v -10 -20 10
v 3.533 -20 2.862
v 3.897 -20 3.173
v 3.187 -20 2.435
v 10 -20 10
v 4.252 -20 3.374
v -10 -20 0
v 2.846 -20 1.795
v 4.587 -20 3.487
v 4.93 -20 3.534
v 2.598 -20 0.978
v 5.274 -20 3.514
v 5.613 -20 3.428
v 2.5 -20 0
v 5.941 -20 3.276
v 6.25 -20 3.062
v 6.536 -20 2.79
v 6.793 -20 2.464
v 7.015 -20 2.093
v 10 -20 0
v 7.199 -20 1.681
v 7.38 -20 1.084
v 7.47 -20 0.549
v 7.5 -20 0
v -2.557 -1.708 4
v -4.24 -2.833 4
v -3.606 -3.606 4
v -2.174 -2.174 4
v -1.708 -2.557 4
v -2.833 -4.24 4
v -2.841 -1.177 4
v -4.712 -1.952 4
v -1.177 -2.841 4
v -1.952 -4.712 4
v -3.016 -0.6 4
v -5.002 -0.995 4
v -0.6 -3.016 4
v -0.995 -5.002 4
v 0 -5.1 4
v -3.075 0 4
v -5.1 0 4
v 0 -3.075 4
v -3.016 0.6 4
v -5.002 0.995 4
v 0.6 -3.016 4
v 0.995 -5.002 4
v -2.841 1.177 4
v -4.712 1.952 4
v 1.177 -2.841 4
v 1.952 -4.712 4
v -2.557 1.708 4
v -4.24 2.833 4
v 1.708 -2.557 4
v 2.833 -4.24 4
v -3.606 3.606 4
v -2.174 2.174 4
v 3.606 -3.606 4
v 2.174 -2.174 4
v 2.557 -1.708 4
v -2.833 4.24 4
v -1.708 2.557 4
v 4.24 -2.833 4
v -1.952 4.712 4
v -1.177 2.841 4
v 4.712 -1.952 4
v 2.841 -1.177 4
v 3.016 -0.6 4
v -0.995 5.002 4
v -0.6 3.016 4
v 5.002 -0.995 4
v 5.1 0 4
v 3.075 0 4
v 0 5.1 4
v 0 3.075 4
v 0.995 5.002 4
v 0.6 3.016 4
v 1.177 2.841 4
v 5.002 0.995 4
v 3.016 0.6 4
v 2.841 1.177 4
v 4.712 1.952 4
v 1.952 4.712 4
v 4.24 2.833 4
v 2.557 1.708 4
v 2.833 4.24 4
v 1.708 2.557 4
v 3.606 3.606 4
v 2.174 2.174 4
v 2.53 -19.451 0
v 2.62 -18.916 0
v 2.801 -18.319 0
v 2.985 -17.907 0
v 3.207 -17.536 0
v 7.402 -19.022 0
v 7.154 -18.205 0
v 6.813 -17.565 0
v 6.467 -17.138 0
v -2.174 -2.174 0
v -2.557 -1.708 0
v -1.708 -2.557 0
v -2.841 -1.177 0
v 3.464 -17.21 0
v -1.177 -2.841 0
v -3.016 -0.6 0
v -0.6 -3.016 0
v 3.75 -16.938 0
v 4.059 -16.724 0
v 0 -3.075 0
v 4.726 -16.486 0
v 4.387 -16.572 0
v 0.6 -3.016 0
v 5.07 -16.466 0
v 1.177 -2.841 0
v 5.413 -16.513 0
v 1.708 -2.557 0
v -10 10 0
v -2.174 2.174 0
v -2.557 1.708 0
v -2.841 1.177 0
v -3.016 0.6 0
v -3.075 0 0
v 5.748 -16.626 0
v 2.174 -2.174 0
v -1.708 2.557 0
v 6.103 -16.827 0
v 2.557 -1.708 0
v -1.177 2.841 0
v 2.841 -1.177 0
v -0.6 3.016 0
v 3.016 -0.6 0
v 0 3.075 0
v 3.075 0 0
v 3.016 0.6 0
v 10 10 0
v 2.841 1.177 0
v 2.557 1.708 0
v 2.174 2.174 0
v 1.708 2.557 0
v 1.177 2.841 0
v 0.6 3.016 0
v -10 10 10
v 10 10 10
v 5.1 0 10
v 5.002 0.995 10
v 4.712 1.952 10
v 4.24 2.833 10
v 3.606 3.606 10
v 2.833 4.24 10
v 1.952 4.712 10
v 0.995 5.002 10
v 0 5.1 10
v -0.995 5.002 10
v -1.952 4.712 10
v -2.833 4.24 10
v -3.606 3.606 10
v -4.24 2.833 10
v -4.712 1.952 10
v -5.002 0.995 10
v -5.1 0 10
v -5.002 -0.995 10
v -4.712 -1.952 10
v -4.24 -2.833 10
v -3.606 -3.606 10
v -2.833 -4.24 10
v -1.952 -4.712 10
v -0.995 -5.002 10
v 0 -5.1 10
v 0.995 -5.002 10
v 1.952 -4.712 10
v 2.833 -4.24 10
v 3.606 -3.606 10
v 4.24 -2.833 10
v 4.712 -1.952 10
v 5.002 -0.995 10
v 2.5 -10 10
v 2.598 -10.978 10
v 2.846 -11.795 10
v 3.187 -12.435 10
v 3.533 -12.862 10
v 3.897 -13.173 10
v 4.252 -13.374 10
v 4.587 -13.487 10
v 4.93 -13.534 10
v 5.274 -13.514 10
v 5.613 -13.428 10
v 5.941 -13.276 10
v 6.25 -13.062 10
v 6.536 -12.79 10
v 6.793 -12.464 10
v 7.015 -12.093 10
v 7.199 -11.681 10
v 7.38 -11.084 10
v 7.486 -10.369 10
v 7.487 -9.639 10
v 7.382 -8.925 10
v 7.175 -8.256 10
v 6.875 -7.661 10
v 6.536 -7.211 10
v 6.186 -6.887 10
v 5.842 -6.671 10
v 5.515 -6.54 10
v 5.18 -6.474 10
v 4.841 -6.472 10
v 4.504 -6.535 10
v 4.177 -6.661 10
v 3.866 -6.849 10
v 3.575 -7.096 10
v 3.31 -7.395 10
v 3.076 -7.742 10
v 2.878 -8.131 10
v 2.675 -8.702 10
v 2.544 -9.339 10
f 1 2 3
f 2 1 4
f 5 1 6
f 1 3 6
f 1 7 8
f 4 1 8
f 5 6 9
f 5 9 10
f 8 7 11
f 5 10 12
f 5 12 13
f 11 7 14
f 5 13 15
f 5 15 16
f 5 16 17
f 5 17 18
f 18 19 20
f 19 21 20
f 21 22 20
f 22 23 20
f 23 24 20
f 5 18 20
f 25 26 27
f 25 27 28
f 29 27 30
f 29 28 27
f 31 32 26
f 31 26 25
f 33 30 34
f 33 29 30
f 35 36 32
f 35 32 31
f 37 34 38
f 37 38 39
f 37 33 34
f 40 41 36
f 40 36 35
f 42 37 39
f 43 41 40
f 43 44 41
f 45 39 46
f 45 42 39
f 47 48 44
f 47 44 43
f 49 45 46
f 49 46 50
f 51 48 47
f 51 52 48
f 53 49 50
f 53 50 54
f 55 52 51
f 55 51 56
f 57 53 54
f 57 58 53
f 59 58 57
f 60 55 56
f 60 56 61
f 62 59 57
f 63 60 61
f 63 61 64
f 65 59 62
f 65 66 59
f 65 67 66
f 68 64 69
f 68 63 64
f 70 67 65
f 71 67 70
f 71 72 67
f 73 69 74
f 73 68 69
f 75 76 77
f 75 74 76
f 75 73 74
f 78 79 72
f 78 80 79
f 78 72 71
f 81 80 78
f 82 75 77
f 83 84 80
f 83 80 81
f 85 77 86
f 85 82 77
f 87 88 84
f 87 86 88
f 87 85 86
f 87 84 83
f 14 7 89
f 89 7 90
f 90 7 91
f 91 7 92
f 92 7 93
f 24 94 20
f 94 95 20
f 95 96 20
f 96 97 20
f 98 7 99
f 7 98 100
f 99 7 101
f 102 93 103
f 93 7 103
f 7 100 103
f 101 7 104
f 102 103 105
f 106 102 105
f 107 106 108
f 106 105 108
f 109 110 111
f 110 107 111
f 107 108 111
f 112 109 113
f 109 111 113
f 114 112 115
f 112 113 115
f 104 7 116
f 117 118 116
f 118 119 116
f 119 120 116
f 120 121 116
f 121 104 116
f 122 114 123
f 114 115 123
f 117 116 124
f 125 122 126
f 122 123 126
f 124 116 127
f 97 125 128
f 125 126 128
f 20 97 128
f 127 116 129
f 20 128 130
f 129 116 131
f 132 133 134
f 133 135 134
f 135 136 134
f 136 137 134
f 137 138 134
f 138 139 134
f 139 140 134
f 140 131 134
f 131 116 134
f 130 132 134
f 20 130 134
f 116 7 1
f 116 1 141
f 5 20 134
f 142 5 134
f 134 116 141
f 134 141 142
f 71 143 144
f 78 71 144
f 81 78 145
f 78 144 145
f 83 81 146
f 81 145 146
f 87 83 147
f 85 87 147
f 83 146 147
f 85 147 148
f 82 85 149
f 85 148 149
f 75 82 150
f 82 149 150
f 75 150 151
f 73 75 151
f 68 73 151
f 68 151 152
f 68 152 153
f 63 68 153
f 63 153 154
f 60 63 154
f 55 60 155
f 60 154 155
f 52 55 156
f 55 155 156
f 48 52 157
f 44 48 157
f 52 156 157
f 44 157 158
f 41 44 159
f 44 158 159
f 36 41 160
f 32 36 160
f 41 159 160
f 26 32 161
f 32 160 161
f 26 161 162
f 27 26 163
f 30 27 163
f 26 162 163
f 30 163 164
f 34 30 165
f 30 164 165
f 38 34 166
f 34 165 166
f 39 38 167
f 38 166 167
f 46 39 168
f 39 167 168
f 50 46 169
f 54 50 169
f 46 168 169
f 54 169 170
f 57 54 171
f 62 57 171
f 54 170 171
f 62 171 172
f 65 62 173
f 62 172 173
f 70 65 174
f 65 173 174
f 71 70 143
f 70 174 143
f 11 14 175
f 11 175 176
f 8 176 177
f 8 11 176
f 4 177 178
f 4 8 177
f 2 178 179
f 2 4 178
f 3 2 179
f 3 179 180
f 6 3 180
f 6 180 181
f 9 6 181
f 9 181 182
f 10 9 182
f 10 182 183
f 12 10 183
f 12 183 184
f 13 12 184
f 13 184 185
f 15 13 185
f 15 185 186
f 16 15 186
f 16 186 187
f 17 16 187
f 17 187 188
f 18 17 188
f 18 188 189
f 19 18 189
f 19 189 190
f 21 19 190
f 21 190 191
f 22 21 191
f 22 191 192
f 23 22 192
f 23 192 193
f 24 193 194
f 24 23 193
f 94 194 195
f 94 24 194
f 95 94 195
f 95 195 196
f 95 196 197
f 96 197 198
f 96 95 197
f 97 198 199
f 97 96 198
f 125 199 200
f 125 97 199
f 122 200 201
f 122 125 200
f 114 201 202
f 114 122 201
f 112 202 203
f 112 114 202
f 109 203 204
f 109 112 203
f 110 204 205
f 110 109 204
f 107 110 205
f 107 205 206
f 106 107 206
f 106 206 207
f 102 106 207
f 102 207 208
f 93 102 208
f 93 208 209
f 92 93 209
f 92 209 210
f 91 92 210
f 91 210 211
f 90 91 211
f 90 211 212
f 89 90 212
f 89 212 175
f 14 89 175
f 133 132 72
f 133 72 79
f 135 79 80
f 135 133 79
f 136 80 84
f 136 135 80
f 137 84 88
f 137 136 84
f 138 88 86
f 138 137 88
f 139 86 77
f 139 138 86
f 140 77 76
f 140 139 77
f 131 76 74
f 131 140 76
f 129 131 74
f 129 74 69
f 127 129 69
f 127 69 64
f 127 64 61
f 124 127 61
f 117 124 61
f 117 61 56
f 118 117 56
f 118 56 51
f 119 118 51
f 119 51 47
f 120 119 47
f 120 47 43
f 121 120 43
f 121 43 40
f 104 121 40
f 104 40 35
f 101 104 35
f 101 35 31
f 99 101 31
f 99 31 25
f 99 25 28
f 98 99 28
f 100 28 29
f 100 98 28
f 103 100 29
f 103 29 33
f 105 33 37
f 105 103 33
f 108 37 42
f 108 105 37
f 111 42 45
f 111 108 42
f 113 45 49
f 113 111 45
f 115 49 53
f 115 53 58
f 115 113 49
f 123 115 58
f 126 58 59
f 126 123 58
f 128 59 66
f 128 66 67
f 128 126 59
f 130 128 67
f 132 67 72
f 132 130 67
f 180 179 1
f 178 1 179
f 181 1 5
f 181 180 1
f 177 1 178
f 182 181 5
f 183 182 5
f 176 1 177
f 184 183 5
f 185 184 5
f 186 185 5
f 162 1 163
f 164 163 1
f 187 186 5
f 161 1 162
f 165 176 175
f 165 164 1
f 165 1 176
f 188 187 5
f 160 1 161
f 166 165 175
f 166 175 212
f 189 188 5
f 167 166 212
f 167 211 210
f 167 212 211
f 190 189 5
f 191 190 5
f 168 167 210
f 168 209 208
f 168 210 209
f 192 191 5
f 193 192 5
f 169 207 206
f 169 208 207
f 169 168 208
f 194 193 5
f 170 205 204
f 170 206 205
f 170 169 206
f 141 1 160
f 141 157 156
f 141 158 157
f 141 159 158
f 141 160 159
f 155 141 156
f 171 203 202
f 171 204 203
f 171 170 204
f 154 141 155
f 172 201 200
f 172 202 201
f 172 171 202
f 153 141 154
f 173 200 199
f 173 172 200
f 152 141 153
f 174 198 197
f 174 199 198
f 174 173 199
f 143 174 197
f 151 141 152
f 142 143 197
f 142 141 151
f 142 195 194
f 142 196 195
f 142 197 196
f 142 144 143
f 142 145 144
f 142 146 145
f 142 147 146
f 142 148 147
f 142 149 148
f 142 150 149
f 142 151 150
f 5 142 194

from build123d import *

# Parameters (mm, degrees)
F0_W     = 20
F0_H     = 30
F0_R     = 3.075
F1_DEPTH = 10
F2_R     = 5.1
F2_R_2   = 3.075
F3_DEPTH = 6
F5_R     = 2.5
F6_DEPTH = 25


with BuildPart() as f1:
    # F0 (on Top) → F1 (new body)
    with BuildSketch(Plane.XY):
        with Locations((0, -5)):
            Rectangle(F0_W, F0_H)
        Circle(F0_R, mode=Mode.SUBTRACT)
    extrude(amount=F1_DEPTH)

    # F2 (on face) → F3 (cut)
    with BuildSketch(Plane.XY.offset(10)):
        Circle(F2_R)
        Circle(F2_R_2, mode=Mode.SUBTRACT)
    extrude(amount=-F3_DEPTH, mode=Mode.SUBTRACT)

    # F5 (on face) → F6 (cut)
    with BuildSketch(Plane(origin=(0, -10, -10), x_dir=(-1, 0, 0), z_dir=(0, 0.707107, 0.707107))):
        with Locations((-5, 14.142136)):
            Circle(F5_R)
    extrude(amount=F6_DEPTH, mode=Mode.SUBTRACT)


solid = f1.part
